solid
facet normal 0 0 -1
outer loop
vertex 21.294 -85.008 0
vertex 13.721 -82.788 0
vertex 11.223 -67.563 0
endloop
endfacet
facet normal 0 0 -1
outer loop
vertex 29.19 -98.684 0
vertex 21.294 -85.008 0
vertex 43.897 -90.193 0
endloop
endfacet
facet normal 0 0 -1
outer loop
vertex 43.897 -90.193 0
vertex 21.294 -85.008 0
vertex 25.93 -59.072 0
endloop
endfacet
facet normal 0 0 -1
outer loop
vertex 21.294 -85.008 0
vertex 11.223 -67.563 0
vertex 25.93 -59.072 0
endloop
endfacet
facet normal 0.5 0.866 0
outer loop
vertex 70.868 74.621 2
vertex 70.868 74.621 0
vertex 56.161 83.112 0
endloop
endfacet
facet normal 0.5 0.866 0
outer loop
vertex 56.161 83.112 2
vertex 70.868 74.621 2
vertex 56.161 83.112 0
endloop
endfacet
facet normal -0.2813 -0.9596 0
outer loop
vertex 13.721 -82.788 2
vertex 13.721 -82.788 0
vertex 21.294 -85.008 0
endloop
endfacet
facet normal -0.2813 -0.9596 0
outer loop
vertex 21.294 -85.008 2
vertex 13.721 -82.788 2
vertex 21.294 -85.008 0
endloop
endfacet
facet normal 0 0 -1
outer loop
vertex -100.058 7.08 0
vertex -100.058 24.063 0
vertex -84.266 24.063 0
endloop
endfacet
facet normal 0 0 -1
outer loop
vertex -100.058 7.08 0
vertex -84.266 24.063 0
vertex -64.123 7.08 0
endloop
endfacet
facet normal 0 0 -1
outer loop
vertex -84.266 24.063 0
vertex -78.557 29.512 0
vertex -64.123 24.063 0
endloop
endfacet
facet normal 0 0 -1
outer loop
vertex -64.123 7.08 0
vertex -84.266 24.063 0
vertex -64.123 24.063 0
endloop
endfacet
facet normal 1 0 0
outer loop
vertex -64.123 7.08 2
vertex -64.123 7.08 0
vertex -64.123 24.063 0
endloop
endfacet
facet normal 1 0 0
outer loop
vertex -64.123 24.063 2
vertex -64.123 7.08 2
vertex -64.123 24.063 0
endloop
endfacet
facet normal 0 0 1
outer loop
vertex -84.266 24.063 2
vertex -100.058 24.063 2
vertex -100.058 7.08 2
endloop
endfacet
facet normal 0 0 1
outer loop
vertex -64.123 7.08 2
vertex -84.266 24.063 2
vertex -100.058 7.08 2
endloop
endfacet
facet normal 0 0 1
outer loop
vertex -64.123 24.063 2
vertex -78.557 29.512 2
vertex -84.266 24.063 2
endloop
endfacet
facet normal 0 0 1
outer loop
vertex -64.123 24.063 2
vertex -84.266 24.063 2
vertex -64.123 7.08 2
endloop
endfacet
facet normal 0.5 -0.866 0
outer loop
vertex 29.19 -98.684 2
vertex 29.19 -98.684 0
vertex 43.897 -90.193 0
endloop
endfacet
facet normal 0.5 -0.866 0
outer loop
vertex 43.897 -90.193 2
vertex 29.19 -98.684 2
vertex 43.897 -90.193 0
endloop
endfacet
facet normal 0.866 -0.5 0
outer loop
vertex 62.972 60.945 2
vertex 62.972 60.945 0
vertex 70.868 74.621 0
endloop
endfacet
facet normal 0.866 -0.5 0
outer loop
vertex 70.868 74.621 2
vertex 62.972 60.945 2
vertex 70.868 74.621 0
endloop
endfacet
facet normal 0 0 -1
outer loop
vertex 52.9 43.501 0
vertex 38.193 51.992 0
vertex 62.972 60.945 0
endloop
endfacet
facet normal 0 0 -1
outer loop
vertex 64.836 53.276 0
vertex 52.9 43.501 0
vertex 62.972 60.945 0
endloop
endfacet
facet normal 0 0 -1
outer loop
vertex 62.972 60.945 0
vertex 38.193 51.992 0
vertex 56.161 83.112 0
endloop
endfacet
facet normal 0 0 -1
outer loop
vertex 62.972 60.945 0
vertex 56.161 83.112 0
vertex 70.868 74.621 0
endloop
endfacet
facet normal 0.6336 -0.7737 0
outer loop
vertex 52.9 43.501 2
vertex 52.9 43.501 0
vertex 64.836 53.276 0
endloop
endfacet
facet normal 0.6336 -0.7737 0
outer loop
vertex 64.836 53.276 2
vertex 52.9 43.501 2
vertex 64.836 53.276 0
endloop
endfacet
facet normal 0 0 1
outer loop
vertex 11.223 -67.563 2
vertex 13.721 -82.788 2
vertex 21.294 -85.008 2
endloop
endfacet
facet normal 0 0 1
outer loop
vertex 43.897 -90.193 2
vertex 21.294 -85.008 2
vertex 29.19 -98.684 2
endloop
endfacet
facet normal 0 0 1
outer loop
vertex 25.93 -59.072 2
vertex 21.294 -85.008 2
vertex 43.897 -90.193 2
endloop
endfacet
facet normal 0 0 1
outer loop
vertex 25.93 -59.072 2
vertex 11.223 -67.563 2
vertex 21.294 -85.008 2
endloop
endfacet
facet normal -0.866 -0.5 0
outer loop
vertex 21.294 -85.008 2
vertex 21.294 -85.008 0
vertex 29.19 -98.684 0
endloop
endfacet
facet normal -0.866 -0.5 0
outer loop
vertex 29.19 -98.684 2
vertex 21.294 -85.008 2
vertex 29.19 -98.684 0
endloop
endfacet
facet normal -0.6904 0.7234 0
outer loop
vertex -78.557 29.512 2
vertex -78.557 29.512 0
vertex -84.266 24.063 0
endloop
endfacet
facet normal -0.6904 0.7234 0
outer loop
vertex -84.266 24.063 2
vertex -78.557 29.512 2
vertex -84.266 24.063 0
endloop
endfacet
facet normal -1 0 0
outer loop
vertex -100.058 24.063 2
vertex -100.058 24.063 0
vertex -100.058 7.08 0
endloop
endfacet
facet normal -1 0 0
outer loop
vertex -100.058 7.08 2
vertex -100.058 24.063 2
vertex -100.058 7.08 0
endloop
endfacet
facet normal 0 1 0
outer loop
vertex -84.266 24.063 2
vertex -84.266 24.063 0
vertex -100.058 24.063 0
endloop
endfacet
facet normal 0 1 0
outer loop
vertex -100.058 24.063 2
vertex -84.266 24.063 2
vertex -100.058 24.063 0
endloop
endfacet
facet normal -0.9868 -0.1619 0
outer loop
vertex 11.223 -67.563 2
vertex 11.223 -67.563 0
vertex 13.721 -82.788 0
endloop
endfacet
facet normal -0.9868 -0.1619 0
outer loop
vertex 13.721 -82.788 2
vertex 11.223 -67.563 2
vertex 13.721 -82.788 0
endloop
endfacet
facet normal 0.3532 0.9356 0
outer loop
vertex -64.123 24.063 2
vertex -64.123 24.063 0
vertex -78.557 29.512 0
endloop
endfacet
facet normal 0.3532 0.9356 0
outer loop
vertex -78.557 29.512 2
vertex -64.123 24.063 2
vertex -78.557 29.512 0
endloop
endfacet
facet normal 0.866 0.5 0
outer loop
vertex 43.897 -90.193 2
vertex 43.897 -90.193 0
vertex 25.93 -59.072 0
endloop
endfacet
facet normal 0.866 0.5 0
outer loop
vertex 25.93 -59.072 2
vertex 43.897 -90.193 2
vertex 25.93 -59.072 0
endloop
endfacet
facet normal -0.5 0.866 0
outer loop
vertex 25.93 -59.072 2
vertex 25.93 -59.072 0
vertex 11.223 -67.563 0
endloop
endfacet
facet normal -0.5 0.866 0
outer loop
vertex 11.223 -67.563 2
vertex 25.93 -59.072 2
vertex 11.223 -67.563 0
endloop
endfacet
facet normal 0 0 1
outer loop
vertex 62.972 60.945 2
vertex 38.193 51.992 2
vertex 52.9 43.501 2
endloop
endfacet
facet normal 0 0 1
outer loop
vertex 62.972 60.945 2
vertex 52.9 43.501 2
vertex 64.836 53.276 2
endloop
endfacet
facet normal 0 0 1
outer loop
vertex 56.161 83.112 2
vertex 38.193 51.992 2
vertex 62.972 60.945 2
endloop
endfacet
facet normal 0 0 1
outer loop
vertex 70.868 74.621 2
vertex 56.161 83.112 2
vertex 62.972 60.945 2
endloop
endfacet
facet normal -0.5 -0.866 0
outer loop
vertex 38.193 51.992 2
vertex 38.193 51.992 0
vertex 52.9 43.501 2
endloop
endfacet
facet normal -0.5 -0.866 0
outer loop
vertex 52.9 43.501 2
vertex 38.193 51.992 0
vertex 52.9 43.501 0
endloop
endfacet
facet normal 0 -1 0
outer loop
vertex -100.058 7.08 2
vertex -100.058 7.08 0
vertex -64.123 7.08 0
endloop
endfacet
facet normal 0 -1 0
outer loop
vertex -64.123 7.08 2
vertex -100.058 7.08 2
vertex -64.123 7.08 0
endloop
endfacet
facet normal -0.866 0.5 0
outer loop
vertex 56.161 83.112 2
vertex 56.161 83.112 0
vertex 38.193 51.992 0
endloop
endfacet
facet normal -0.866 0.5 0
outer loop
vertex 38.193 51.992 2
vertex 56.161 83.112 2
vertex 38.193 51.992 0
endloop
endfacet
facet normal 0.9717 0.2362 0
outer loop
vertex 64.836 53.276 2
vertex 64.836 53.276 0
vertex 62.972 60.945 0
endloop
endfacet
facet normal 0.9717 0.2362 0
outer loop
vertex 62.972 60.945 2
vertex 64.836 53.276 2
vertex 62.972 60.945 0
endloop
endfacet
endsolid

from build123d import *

# Parameters (mm, degrees)
F1_DEPTH = 2


with BuildPart() as f1:
    # F0 (on Top) → F1 (new body)
    with BuildSketch(Plane.XY):
        Polygon((-84.265687, 24.062581), (-100.057788, 24.062581), (-100.057788, 7.080483), (-64.122945, 7.080483), (-64.122945, 24.062581), (-78.556776, 29.511524), align=None)
        Polygon((43.897016, -90.192828), (25.929594, -59.072341), (11.222666, -67.56339), (13.720658, -82.787926), (21.294037, -85.007516), (29.190087, -98.683877), align=None)
        Polygon((56.160772, 83.112345), (38.193351, 51.991858), (52.900279, 43.500809), (64.836118, 53.276402), (62.97165, 60.944935), (70.867701, 74.621296), align=None)
    extrude(amount=F1_DEPTH)


solid = f1.part
